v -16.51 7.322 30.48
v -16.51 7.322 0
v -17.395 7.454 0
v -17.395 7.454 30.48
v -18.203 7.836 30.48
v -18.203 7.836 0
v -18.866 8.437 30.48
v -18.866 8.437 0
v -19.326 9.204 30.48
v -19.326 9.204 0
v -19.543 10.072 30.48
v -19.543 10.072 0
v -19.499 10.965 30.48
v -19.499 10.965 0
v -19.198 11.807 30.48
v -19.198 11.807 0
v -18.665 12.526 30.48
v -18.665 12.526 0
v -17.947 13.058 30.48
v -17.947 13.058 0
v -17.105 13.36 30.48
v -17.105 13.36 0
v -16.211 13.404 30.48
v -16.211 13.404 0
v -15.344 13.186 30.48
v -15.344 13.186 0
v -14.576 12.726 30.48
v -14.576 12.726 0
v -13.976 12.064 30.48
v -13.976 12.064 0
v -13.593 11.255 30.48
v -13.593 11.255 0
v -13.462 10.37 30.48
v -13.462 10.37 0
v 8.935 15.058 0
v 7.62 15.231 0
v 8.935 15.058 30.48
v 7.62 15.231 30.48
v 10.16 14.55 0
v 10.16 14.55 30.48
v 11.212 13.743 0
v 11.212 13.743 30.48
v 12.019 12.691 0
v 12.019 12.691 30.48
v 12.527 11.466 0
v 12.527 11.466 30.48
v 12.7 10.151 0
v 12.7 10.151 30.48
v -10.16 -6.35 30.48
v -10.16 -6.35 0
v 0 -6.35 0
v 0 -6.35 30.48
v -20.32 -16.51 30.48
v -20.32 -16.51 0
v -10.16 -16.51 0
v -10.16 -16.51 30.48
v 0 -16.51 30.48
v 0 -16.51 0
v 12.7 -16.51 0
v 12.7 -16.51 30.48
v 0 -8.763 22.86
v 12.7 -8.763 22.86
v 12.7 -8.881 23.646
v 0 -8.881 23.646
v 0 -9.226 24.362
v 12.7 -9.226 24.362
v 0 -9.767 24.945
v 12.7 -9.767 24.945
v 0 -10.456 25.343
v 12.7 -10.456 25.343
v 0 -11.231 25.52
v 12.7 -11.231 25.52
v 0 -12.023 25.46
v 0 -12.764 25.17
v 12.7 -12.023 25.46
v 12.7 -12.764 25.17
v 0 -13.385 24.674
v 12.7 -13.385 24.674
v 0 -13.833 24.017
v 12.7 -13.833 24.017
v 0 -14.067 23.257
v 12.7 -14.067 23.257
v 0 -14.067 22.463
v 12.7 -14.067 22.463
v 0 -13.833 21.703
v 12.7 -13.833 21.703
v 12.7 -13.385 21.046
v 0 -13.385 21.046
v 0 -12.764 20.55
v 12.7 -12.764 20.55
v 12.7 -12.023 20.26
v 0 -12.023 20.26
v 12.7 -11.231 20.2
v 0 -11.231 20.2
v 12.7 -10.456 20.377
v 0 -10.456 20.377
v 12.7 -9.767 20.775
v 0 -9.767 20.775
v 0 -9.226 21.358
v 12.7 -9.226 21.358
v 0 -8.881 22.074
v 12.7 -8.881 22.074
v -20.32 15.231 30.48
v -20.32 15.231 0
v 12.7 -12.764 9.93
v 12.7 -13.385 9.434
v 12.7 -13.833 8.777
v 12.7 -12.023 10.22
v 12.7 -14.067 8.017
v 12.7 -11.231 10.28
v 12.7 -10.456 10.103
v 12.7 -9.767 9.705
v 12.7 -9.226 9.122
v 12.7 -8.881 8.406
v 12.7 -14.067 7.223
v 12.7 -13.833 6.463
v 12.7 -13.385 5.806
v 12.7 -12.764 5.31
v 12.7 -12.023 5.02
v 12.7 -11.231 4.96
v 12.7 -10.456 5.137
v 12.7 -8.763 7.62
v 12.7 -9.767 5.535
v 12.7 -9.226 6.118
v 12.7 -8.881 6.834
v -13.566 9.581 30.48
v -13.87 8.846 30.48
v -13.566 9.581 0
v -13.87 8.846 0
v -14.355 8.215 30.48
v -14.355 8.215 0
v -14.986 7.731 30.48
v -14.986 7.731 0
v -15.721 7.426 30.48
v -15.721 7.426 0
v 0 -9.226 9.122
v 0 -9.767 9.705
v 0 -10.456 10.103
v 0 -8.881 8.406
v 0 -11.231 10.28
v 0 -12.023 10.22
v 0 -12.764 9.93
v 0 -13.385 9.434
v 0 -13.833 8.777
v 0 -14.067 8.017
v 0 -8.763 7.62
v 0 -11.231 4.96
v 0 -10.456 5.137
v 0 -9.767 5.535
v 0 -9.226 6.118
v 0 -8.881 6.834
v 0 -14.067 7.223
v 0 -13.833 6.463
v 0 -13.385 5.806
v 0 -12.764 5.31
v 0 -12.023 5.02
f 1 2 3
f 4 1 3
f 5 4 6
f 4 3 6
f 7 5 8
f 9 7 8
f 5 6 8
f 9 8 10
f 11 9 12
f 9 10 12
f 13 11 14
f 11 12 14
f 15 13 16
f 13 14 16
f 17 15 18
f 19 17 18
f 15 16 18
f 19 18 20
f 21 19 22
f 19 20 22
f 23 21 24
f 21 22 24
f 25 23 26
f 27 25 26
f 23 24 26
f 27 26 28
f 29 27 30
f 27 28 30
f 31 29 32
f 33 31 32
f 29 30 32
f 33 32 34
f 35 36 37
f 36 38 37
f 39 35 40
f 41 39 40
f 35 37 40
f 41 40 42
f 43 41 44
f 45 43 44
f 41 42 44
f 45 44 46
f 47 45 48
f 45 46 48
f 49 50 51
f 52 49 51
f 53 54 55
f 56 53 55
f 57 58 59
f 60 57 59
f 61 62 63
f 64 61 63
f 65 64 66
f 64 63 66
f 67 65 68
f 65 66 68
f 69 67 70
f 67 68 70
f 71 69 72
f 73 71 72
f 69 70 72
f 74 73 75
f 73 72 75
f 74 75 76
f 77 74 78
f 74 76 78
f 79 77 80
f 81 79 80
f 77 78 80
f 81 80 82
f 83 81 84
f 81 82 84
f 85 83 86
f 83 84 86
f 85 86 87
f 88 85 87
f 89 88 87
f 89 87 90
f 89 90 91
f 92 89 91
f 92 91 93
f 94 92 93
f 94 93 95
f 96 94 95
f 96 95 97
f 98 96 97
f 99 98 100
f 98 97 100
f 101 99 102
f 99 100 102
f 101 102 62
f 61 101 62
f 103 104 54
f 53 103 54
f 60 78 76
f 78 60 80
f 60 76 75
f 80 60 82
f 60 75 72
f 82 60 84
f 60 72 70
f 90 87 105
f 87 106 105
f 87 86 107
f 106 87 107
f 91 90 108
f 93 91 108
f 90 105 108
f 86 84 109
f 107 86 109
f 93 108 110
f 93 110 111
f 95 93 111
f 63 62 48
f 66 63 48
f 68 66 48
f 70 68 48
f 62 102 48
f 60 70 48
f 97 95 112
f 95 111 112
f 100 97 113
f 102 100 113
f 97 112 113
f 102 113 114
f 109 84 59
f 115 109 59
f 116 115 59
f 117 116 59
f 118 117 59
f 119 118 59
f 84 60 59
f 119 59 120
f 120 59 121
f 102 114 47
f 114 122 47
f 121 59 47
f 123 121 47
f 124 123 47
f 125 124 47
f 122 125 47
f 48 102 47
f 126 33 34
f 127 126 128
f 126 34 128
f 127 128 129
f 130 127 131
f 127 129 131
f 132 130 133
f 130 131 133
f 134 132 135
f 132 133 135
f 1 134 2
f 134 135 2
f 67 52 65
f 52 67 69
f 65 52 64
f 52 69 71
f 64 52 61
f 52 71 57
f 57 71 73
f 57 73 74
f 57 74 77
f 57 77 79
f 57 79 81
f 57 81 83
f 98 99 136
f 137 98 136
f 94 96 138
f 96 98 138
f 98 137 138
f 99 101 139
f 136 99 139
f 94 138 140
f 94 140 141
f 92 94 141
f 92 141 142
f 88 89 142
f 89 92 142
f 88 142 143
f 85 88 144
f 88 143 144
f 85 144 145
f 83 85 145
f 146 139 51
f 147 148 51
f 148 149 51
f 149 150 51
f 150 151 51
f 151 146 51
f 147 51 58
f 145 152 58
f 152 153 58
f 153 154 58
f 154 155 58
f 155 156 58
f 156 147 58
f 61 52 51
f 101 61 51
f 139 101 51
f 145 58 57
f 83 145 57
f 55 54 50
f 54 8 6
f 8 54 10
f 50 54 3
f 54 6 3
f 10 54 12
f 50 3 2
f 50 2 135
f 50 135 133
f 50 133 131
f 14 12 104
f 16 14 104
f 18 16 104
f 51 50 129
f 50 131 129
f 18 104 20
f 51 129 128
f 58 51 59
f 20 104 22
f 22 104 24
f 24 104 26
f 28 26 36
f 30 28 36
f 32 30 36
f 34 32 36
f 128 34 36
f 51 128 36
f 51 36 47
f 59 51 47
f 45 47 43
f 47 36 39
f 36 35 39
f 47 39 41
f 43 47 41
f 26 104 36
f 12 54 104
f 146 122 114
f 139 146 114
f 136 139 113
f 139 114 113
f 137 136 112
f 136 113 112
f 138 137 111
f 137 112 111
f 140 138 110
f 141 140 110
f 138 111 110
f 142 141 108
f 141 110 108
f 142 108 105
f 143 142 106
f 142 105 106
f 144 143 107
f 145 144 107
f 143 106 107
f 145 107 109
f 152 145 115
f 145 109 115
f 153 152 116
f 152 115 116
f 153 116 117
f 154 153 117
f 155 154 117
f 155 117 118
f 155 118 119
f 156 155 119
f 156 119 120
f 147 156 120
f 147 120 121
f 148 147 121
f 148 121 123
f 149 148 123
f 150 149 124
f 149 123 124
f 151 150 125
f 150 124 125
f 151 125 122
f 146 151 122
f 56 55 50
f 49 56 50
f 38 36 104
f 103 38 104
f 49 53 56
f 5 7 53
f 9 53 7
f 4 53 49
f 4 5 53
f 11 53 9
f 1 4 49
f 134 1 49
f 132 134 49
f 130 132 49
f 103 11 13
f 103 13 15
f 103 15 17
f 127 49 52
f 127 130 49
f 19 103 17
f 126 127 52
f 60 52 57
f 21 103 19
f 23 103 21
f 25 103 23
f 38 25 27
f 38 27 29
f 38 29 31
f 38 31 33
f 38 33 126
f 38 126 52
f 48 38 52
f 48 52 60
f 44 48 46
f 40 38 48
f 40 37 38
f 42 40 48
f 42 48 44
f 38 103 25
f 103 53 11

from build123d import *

# Parameters (mm, degrees)
F1_DEPTH = 30.48
F2_R     = 2.667
F3_DEPTH = 12.7
F4_R     = 5.08


with BuildPart() as f1:
    # F0 (on Top) → F1 (new body)
    with BuildSketch(Plane.XY):
        Polygon((-10.16, -16.51), (-10.16, -6.35), (0, -6.35), (0, -16.51), (12.7, -16.51), (12.7, -6.35), (12.7, 15.231052), (-17.145, 15.231052), (-20.32, 15.231052), (-20.32, -16.51), (-16.51, -16.51), align=None)
        with BuildLine():
            ThreePointArc((-13.462, 10.370257), (-14.354739, 8.214996), (-16.51, 7.322257))
            ThreePointArc((-16.51, 7.322257), (-18.665261, 12.525519), (-13.462, 10.370257))
        make_face(mode=Mode.SUBTRACT)
    extrude(amount=F1_DEPTH)

    # F2 (on face) → F3 (cut, through all)
    with BuildSketch(Plane.YZ.offset(12.7)):
        with Locations((-11.43, 22.86)):
            Circle(F2_R)
        with Locations((-11.43, 7.62)):
            Circle(F2_R)
    extrude(amount=-F3_DEPTH, mode=Mode.SUBTRACT)

    # F4
    f4_edges = [f1.edges().sort_by_distance(p)[0] for p in [
        (12.7, 15.231052, 15.24),
    ]]
    fillet(f4_edges, radius=F4_R)


solid = f1.part
